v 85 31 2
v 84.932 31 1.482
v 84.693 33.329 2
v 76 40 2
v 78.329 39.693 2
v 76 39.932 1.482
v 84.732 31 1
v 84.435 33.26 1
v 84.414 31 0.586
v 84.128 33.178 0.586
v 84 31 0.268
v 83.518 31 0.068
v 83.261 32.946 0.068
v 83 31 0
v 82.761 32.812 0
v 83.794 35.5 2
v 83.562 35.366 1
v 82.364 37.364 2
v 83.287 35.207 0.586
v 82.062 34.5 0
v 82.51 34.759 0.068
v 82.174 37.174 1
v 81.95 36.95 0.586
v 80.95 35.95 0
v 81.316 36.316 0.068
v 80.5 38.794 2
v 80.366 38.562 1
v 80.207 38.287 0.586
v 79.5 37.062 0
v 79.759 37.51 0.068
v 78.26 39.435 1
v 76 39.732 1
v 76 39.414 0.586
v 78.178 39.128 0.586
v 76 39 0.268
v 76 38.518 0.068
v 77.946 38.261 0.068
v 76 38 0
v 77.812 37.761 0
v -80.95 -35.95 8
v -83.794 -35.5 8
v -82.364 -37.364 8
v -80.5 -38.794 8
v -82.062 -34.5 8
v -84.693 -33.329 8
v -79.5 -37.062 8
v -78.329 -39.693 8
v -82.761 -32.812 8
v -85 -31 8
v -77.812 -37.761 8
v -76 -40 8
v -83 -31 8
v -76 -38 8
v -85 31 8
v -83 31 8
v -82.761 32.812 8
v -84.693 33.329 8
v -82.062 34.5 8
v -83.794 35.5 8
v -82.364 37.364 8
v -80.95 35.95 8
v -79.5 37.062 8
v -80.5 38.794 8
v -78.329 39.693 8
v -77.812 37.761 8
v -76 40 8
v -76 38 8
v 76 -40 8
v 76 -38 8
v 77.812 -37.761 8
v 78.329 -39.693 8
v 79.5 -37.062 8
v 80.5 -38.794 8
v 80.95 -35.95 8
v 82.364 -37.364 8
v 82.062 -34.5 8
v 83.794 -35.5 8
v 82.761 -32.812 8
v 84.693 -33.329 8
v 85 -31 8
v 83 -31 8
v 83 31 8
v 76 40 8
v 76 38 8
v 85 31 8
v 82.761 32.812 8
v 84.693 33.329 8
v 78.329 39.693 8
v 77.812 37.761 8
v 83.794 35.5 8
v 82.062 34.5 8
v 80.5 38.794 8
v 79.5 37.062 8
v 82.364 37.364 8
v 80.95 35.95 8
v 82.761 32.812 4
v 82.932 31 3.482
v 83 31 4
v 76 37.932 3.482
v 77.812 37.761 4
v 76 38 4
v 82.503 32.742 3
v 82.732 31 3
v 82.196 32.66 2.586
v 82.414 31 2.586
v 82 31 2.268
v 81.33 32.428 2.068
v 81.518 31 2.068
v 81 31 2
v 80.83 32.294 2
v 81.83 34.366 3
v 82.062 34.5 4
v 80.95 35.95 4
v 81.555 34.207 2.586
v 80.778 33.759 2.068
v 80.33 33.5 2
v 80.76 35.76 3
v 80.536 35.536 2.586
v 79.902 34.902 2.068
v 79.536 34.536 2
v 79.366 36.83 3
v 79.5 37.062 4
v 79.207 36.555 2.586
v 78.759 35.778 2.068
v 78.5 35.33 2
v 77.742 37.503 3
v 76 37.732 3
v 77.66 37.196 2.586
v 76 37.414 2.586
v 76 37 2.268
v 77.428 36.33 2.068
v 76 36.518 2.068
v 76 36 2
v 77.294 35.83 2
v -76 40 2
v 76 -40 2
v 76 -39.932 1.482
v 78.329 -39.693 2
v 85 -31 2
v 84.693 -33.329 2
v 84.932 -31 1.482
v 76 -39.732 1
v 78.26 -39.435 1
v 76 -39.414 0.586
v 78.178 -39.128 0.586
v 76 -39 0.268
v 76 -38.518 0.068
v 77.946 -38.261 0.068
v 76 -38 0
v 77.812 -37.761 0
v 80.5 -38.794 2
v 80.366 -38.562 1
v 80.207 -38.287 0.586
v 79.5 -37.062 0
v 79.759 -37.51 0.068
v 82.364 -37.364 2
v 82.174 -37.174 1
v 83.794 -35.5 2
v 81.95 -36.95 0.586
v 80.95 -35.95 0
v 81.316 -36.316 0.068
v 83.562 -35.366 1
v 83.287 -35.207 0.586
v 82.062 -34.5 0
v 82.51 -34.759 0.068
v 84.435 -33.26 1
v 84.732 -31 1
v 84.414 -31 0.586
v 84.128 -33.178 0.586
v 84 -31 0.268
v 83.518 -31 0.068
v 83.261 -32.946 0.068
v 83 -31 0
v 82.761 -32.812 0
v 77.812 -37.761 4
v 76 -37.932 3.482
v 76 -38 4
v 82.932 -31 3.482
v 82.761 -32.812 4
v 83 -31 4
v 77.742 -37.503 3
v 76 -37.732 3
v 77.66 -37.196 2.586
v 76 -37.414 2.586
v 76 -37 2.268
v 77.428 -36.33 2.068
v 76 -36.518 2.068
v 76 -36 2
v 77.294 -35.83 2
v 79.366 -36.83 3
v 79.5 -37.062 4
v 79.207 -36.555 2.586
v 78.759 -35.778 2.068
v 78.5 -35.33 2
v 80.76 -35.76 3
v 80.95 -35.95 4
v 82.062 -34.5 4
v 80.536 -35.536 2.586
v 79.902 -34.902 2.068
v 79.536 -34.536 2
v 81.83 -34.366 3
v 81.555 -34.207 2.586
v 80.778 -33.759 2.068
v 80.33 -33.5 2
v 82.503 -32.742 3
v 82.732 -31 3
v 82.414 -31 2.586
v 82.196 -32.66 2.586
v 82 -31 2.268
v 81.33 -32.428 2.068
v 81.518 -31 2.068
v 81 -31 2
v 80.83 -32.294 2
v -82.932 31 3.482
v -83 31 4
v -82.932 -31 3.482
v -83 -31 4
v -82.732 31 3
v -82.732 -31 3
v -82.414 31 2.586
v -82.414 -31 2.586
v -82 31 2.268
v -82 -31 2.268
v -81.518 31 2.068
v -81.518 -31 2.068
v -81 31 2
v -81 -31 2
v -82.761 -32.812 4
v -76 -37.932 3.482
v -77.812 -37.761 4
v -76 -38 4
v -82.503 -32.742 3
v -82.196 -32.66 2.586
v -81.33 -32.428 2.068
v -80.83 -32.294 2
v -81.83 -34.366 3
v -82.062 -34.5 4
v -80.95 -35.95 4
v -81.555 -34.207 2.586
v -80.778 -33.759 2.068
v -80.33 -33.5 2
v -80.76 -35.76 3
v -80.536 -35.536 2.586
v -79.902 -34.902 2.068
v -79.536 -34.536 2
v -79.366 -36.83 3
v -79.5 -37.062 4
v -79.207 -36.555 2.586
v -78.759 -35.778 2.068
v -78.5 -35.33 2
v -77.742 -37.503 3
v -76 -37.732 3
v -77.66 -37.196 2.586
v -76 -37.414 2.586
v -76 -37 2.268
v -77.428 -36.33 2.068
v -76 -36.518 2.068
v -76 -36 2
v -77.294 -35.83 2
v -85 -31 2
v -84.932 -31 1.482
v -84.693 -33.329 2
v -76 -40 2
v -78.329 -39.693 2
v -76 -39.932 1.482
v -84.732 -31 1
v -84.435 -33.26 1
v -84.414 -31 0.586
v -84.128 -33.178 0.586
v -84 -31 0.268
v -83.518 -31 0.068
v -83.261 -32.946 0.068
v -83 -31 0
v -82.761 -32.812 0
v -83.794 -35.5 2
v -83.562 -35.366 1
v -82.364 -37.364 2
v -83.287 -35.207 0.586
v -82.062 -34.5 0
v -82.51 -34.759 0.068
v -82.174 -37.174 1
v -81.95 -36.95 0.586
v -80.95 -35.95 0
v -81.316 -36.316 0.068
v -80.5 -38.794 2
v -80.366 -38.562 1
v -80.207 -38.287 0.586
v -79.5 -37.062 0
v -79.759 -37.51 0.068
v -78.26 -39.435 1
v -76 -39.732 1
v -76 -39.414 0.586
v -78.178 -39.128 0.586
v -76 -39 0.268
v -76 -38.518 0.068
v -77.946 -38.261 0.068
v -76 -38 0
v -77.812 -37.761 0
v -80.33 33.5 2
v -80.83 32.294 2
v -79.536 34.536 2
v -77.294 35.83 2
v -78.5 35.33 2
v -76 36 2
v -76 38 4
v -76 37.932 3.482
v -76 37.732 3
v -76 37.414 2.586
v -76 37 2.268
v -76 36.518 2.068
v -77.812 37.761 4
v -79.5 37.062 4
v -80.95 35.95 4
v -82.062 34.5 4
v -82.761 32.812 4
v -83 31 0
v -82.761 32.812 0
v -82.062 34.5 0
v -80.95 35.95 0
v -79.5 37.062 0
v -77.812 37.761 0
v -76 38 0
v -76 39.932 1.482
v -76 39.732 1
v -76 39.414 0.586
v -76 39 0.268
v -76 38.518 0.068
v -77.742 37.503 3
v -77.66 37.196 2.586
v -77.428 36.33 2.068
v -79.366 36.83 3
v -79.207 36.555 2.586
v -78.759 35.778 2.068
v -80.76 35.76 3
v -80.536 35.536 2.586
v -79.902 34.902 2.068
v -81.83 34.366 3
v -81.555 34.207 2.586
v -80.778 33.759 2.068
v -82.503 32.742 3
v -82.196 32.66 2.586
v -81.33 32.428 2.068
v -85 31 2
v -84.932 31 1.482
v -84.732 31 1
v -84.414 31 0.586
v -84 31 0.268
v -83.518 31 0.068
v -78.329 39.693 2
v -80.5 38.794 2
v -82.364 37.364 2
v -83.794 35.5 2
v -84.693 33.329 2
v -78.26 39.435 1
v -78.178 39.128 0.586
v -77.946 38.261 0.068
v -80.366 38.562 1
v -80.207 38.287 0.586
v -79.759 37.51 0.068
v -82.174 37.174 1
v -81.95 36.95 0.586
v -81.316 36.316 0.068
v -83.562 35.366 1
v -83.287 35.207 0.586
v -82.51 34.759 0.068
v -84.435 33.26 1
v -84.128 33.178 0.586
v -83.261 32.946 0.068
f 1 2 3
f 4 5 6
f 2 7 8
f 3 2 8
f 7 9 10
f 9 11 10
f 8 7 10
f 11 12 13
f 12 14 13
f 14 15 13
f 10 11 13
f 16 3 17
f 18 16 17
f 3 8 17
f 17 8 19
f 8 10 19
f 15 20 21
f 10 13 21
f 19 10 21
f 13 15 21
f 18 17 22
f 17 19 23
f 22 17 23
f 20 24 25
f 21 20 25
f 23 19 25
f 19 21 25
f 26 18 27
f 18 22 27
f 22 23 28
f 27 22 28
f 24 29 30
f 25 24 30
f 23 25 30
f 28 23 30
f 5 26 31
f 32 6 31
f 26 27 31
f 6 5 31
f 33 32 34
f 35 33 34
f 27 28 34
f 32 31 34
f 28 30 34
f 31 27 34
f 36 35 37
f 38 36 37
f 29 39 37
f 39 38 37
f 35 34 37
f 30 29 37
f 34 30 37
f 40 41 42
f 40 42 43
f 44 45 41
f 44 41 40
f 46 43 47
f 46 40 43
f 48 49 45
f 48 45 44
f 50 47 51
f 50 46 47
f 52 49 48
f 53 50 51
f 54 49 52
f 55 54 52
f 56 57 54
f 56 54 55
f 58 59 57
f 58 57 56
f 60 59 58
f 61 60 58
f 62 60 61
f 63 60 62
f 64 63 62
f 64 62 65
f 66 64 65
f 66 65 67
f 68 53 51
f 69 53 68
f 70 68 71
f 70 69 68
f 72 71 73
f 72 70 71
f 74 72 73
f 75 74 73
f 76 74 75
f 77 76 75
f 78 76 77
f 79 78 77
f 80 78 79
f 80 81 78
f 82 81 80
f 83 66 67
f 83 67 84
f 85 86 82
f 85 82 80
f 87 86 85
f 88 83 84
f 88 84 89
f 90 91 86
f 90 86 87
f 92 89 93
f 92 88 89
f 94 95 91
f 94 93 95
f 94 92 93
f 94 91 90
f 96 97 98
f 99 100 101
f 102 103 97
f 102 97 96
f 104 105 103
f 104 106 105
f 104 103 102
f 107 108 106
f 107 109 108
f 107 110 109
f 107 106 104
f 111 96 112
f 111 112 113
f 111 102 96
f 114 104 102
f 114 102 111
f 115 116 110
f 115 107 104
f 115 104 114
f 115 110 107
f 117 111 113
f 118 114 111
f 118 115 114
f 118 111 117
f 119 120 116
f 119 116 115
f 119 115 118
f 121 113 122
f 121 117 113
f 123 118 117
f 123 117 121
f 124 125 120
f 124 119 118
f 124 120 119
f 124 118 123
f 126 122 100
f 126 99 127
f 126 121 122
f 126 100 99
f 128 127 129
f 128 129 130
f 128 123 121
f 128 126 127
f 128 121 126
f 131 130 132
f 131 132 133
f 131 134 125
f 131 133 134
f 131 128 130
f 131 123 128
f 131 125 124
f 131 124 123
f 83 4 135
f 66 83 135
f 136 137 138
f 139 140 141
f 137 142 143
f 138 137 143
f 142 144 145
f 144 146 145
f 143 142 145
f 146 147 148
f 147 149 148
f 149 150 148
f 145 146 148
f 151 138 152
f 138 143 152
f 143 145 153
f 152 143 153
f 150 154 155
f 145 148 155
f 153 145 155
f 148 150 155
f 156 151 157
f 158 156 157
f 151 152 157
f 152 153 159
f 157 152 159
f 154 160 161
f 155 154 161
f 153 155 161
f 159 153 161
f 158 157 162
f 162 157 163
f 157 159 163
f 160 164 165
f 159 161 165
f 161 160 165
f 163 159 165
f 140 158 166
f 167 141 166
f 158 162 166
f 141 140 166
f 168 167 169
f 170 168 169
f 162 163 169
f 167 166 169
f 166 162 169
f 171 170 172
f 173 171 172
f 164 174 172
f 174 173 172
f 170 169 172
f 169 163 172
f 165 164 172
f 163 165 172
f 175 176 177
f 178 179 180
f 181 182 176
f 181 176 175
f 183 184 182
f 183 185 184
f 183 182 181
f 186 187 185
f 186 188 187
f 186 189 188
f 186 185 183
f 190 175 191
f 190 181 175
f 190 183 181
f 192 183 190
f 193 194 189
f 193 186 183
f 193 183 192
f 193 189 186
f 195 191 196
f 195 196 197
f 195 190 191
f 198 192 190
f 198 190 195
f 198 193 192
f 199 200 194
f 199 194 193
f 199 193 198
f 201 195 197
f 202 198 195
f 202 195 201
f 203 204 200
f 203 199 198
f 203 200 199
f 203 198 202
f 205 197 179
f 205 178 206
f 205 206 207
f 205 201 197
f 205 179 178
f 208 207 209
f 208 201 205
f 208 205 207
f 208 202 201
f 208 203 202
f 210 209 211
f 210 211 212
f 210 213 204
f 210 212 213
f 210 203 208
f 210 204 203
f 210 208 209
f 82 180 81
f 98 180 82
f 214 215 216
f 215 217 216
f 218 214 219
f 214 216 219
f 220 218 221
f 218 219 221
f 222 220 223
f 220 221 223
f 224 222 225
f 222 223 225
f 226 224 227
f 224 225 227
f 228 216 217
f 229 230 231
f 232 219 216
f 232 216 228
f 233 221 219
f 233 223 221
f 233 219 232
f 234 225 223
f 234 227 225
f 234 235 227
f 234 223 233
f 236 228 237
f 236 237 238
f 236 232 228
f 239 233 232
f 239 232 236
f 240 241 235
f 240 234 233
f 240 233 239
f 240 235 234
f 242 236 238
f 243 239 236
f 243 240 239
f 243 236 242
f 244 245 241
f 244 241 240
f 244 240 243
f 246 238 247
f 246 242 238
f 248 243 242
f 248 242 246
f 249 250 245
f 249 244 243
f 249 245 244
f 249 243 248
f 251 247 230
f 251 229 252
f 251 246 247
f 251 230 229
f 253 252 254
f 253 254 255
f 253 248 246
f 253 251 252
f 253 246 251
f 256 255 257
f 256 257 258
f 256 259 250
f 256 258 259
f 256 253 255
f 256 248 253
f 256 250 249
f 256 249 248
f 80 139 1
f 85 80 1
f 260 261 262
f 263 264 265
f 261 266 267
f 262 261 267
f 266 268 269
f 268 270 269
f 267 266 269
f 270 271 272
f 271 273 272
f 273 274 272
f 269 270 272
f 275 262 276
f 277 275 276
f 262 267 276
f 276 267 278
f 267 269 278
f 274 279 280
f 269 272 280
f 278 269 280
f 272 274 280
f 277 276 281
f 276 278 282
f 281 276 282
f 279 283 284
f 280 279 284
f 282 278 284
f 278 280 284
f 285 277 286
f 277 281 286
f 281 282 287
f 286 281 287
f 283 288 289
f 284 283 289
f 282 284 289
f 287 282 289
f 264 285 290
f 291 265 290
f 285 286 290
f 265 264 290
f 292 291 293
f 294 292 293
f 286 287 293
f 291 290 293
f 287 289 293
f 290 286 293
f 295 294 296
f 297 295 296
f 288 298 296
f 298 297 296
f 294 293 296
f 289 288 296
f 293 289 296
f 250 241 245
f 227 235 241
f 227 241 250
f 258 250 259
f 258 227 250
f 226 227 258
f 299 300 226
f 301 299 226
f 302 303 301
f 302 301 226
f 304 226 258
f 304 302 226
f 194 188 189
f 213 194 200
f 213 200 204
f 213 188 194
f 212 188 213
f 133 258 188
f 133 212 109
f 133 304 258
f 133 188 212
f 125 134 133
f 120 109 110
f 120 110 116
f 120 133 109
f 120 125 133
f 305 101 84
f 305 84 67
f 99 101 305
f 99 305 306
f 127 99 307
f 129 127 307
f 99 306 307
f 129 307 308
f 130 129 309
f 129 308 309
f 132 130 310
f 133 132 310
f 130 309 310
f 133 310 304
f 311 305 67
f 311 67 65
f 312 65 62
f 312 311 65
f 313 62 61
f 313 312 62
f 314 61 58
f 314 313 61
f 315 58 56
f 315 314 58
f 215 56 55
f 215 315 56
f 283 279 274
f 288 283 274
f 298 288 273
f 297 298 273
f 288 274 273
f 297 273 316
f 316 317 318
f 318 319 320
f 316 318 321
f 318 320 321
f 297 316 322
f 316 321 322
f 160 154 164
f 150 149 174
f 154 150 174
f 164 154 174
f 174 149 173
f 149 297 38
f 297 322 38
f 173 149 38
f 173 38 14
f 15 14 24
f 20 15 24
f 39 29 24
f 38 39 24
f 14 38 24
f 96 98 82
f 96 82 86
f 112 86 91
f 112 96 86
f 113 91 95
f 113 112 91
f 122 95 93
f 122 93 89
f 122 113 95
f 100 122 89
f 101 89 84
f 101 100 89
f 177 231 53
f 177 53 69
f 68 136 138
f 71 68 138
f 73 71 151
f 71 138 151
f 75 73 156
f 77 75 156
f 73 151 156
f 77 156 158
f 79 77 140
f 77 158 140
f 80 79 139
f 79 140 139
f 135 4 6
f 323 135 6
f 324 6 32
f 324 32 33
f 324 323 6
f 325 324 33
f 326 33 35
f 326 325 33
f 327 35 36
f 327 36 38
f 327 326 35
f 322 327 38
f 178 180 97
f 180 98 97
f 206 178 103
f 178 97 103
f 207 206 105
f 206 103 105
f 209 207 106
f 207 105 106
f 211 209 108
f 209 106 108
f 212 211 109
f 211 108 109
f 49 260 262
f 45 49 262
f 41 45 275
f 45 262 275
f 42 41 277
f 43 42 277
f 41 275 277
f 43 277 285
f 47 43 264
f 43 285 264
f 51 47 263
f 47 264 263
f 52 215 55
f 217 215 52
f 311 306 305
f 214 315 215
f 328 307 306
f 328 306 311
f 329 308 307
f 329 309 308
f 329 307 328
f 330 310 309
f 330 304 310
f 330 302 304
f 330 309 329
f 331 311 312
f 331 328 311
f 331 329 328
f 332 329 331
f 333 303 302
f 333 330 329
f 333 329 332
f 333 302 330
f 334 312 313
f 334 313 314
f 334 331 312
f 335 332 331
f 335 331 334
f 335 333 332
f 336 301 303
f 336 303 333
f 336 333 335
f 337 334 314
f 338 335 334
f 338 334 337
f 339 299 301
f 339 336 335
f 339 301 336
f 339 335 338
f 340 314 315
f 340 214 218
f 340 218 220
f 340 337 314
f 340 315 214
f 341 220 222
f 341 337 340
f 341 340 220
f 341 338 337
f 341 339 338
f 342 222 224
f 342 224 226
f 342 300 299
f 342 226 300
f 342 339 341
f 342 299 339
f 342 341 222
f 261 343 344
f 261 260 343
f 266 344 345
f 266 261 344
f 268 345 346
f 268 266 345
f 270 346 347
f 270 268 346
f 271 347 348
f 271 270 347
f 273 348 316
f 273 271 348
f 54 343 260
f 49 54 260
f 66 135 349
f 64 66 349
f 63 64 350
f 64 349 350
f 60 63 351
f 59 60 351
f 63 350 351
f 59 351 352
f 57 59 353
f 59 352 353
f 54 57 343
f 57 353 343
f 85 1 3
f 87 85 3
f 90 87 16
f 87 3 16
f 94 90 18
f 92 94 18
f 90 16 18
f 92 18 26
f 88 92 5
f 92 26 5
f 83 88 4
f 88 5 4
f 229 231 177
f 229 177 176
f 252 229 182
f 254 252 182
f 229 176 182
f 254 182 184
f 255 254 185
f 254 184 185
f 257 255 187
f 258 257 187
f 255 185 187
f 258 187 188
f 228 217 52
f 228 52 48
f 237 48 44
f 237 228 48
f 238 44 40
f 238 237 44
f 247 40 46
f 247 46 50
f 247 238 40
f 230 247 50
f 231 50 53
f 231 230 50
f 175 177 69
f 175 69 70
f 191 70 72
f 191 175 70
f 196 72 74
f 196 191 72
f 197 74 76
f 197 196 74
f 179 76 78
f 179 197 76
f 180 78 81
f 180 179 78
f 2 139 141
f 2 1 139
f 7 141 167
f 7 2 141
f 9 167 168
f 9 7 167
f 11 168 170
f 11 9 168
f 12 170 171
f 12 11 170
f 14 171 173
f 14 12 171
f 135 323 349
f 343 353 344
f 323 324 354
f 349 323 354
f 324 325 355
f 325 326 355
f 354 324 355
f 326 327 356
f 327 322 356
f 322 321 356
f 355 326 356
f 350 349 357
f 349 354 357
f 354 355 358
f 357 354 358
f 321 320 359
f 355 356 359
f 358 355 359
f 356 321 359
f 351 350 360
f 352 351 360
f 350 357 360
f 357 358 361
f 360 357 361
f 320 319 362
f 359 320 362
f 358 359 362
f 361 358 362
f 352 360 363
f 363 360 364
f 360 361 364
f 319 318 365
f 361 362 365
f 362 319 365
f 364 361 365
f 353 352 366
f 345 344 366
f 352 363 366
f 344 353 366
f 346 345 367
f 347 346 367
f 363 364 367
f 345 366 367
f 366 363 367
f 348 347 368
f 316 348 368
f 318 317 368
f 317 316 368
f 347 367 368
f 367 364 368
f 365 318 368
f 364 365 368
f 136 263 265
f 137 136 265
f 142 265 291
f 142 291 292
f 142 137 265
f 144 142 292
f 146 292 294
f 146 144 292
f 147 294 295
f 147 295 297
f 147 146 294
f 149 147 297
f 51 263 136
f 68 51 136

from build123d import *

# Parameters (mm, degrees)
F1_DEPTH = 8
F2_T     = -2
F3_R     = 2
F4_R     = 2


with BuildPart() as f1:
    # F0 (on Top) → F1 (new body)
    with BuildSketch(Plane.XY):
        with BuildLine():
            ThreePointArc((-85, -31), (-82.3639610307, -37.3639610307), (-76, -40))
            Line((-76, -40), (76, -40))
            ThreePointArc((76, -40), (82.3639610307, -37.3639610307), (85, -31))
            Line((85, -31), (85, 31))
            ThreePointArc((85, 31), (82.3639610307, 37.3639610307), (76, 40))
            Line((76, 40), (-76, 40))
            ThreePointArc((-76, 40), (-82.3639610307, 37.3639610307), (-85, 31))
            Line((-85, 31), (-85, -31))
        make_face()
    extrude(amount=F1_DEPTH)

    # F2
    f2_openings = [f1.faces().sort_by_distance(p)[0] for p in [
        (0, 0, 8),
    ]]
    offset(amount=F2_T, openings=f2_openings)

    # F3
    f3_edges = [f1.edges().sort_by_distance(p)[0] for p in [
        (0, 38, 2),
    ]]
    fillet(f3_edges, radius=F3_R)

    # F4
    f4_edges = [f1.edges().sort_by_distance(p)[0] for p in [
        (0, -40, 0),
    ]]
    fillet(f4_edges, radius=F4_R)


solid = f1.part
